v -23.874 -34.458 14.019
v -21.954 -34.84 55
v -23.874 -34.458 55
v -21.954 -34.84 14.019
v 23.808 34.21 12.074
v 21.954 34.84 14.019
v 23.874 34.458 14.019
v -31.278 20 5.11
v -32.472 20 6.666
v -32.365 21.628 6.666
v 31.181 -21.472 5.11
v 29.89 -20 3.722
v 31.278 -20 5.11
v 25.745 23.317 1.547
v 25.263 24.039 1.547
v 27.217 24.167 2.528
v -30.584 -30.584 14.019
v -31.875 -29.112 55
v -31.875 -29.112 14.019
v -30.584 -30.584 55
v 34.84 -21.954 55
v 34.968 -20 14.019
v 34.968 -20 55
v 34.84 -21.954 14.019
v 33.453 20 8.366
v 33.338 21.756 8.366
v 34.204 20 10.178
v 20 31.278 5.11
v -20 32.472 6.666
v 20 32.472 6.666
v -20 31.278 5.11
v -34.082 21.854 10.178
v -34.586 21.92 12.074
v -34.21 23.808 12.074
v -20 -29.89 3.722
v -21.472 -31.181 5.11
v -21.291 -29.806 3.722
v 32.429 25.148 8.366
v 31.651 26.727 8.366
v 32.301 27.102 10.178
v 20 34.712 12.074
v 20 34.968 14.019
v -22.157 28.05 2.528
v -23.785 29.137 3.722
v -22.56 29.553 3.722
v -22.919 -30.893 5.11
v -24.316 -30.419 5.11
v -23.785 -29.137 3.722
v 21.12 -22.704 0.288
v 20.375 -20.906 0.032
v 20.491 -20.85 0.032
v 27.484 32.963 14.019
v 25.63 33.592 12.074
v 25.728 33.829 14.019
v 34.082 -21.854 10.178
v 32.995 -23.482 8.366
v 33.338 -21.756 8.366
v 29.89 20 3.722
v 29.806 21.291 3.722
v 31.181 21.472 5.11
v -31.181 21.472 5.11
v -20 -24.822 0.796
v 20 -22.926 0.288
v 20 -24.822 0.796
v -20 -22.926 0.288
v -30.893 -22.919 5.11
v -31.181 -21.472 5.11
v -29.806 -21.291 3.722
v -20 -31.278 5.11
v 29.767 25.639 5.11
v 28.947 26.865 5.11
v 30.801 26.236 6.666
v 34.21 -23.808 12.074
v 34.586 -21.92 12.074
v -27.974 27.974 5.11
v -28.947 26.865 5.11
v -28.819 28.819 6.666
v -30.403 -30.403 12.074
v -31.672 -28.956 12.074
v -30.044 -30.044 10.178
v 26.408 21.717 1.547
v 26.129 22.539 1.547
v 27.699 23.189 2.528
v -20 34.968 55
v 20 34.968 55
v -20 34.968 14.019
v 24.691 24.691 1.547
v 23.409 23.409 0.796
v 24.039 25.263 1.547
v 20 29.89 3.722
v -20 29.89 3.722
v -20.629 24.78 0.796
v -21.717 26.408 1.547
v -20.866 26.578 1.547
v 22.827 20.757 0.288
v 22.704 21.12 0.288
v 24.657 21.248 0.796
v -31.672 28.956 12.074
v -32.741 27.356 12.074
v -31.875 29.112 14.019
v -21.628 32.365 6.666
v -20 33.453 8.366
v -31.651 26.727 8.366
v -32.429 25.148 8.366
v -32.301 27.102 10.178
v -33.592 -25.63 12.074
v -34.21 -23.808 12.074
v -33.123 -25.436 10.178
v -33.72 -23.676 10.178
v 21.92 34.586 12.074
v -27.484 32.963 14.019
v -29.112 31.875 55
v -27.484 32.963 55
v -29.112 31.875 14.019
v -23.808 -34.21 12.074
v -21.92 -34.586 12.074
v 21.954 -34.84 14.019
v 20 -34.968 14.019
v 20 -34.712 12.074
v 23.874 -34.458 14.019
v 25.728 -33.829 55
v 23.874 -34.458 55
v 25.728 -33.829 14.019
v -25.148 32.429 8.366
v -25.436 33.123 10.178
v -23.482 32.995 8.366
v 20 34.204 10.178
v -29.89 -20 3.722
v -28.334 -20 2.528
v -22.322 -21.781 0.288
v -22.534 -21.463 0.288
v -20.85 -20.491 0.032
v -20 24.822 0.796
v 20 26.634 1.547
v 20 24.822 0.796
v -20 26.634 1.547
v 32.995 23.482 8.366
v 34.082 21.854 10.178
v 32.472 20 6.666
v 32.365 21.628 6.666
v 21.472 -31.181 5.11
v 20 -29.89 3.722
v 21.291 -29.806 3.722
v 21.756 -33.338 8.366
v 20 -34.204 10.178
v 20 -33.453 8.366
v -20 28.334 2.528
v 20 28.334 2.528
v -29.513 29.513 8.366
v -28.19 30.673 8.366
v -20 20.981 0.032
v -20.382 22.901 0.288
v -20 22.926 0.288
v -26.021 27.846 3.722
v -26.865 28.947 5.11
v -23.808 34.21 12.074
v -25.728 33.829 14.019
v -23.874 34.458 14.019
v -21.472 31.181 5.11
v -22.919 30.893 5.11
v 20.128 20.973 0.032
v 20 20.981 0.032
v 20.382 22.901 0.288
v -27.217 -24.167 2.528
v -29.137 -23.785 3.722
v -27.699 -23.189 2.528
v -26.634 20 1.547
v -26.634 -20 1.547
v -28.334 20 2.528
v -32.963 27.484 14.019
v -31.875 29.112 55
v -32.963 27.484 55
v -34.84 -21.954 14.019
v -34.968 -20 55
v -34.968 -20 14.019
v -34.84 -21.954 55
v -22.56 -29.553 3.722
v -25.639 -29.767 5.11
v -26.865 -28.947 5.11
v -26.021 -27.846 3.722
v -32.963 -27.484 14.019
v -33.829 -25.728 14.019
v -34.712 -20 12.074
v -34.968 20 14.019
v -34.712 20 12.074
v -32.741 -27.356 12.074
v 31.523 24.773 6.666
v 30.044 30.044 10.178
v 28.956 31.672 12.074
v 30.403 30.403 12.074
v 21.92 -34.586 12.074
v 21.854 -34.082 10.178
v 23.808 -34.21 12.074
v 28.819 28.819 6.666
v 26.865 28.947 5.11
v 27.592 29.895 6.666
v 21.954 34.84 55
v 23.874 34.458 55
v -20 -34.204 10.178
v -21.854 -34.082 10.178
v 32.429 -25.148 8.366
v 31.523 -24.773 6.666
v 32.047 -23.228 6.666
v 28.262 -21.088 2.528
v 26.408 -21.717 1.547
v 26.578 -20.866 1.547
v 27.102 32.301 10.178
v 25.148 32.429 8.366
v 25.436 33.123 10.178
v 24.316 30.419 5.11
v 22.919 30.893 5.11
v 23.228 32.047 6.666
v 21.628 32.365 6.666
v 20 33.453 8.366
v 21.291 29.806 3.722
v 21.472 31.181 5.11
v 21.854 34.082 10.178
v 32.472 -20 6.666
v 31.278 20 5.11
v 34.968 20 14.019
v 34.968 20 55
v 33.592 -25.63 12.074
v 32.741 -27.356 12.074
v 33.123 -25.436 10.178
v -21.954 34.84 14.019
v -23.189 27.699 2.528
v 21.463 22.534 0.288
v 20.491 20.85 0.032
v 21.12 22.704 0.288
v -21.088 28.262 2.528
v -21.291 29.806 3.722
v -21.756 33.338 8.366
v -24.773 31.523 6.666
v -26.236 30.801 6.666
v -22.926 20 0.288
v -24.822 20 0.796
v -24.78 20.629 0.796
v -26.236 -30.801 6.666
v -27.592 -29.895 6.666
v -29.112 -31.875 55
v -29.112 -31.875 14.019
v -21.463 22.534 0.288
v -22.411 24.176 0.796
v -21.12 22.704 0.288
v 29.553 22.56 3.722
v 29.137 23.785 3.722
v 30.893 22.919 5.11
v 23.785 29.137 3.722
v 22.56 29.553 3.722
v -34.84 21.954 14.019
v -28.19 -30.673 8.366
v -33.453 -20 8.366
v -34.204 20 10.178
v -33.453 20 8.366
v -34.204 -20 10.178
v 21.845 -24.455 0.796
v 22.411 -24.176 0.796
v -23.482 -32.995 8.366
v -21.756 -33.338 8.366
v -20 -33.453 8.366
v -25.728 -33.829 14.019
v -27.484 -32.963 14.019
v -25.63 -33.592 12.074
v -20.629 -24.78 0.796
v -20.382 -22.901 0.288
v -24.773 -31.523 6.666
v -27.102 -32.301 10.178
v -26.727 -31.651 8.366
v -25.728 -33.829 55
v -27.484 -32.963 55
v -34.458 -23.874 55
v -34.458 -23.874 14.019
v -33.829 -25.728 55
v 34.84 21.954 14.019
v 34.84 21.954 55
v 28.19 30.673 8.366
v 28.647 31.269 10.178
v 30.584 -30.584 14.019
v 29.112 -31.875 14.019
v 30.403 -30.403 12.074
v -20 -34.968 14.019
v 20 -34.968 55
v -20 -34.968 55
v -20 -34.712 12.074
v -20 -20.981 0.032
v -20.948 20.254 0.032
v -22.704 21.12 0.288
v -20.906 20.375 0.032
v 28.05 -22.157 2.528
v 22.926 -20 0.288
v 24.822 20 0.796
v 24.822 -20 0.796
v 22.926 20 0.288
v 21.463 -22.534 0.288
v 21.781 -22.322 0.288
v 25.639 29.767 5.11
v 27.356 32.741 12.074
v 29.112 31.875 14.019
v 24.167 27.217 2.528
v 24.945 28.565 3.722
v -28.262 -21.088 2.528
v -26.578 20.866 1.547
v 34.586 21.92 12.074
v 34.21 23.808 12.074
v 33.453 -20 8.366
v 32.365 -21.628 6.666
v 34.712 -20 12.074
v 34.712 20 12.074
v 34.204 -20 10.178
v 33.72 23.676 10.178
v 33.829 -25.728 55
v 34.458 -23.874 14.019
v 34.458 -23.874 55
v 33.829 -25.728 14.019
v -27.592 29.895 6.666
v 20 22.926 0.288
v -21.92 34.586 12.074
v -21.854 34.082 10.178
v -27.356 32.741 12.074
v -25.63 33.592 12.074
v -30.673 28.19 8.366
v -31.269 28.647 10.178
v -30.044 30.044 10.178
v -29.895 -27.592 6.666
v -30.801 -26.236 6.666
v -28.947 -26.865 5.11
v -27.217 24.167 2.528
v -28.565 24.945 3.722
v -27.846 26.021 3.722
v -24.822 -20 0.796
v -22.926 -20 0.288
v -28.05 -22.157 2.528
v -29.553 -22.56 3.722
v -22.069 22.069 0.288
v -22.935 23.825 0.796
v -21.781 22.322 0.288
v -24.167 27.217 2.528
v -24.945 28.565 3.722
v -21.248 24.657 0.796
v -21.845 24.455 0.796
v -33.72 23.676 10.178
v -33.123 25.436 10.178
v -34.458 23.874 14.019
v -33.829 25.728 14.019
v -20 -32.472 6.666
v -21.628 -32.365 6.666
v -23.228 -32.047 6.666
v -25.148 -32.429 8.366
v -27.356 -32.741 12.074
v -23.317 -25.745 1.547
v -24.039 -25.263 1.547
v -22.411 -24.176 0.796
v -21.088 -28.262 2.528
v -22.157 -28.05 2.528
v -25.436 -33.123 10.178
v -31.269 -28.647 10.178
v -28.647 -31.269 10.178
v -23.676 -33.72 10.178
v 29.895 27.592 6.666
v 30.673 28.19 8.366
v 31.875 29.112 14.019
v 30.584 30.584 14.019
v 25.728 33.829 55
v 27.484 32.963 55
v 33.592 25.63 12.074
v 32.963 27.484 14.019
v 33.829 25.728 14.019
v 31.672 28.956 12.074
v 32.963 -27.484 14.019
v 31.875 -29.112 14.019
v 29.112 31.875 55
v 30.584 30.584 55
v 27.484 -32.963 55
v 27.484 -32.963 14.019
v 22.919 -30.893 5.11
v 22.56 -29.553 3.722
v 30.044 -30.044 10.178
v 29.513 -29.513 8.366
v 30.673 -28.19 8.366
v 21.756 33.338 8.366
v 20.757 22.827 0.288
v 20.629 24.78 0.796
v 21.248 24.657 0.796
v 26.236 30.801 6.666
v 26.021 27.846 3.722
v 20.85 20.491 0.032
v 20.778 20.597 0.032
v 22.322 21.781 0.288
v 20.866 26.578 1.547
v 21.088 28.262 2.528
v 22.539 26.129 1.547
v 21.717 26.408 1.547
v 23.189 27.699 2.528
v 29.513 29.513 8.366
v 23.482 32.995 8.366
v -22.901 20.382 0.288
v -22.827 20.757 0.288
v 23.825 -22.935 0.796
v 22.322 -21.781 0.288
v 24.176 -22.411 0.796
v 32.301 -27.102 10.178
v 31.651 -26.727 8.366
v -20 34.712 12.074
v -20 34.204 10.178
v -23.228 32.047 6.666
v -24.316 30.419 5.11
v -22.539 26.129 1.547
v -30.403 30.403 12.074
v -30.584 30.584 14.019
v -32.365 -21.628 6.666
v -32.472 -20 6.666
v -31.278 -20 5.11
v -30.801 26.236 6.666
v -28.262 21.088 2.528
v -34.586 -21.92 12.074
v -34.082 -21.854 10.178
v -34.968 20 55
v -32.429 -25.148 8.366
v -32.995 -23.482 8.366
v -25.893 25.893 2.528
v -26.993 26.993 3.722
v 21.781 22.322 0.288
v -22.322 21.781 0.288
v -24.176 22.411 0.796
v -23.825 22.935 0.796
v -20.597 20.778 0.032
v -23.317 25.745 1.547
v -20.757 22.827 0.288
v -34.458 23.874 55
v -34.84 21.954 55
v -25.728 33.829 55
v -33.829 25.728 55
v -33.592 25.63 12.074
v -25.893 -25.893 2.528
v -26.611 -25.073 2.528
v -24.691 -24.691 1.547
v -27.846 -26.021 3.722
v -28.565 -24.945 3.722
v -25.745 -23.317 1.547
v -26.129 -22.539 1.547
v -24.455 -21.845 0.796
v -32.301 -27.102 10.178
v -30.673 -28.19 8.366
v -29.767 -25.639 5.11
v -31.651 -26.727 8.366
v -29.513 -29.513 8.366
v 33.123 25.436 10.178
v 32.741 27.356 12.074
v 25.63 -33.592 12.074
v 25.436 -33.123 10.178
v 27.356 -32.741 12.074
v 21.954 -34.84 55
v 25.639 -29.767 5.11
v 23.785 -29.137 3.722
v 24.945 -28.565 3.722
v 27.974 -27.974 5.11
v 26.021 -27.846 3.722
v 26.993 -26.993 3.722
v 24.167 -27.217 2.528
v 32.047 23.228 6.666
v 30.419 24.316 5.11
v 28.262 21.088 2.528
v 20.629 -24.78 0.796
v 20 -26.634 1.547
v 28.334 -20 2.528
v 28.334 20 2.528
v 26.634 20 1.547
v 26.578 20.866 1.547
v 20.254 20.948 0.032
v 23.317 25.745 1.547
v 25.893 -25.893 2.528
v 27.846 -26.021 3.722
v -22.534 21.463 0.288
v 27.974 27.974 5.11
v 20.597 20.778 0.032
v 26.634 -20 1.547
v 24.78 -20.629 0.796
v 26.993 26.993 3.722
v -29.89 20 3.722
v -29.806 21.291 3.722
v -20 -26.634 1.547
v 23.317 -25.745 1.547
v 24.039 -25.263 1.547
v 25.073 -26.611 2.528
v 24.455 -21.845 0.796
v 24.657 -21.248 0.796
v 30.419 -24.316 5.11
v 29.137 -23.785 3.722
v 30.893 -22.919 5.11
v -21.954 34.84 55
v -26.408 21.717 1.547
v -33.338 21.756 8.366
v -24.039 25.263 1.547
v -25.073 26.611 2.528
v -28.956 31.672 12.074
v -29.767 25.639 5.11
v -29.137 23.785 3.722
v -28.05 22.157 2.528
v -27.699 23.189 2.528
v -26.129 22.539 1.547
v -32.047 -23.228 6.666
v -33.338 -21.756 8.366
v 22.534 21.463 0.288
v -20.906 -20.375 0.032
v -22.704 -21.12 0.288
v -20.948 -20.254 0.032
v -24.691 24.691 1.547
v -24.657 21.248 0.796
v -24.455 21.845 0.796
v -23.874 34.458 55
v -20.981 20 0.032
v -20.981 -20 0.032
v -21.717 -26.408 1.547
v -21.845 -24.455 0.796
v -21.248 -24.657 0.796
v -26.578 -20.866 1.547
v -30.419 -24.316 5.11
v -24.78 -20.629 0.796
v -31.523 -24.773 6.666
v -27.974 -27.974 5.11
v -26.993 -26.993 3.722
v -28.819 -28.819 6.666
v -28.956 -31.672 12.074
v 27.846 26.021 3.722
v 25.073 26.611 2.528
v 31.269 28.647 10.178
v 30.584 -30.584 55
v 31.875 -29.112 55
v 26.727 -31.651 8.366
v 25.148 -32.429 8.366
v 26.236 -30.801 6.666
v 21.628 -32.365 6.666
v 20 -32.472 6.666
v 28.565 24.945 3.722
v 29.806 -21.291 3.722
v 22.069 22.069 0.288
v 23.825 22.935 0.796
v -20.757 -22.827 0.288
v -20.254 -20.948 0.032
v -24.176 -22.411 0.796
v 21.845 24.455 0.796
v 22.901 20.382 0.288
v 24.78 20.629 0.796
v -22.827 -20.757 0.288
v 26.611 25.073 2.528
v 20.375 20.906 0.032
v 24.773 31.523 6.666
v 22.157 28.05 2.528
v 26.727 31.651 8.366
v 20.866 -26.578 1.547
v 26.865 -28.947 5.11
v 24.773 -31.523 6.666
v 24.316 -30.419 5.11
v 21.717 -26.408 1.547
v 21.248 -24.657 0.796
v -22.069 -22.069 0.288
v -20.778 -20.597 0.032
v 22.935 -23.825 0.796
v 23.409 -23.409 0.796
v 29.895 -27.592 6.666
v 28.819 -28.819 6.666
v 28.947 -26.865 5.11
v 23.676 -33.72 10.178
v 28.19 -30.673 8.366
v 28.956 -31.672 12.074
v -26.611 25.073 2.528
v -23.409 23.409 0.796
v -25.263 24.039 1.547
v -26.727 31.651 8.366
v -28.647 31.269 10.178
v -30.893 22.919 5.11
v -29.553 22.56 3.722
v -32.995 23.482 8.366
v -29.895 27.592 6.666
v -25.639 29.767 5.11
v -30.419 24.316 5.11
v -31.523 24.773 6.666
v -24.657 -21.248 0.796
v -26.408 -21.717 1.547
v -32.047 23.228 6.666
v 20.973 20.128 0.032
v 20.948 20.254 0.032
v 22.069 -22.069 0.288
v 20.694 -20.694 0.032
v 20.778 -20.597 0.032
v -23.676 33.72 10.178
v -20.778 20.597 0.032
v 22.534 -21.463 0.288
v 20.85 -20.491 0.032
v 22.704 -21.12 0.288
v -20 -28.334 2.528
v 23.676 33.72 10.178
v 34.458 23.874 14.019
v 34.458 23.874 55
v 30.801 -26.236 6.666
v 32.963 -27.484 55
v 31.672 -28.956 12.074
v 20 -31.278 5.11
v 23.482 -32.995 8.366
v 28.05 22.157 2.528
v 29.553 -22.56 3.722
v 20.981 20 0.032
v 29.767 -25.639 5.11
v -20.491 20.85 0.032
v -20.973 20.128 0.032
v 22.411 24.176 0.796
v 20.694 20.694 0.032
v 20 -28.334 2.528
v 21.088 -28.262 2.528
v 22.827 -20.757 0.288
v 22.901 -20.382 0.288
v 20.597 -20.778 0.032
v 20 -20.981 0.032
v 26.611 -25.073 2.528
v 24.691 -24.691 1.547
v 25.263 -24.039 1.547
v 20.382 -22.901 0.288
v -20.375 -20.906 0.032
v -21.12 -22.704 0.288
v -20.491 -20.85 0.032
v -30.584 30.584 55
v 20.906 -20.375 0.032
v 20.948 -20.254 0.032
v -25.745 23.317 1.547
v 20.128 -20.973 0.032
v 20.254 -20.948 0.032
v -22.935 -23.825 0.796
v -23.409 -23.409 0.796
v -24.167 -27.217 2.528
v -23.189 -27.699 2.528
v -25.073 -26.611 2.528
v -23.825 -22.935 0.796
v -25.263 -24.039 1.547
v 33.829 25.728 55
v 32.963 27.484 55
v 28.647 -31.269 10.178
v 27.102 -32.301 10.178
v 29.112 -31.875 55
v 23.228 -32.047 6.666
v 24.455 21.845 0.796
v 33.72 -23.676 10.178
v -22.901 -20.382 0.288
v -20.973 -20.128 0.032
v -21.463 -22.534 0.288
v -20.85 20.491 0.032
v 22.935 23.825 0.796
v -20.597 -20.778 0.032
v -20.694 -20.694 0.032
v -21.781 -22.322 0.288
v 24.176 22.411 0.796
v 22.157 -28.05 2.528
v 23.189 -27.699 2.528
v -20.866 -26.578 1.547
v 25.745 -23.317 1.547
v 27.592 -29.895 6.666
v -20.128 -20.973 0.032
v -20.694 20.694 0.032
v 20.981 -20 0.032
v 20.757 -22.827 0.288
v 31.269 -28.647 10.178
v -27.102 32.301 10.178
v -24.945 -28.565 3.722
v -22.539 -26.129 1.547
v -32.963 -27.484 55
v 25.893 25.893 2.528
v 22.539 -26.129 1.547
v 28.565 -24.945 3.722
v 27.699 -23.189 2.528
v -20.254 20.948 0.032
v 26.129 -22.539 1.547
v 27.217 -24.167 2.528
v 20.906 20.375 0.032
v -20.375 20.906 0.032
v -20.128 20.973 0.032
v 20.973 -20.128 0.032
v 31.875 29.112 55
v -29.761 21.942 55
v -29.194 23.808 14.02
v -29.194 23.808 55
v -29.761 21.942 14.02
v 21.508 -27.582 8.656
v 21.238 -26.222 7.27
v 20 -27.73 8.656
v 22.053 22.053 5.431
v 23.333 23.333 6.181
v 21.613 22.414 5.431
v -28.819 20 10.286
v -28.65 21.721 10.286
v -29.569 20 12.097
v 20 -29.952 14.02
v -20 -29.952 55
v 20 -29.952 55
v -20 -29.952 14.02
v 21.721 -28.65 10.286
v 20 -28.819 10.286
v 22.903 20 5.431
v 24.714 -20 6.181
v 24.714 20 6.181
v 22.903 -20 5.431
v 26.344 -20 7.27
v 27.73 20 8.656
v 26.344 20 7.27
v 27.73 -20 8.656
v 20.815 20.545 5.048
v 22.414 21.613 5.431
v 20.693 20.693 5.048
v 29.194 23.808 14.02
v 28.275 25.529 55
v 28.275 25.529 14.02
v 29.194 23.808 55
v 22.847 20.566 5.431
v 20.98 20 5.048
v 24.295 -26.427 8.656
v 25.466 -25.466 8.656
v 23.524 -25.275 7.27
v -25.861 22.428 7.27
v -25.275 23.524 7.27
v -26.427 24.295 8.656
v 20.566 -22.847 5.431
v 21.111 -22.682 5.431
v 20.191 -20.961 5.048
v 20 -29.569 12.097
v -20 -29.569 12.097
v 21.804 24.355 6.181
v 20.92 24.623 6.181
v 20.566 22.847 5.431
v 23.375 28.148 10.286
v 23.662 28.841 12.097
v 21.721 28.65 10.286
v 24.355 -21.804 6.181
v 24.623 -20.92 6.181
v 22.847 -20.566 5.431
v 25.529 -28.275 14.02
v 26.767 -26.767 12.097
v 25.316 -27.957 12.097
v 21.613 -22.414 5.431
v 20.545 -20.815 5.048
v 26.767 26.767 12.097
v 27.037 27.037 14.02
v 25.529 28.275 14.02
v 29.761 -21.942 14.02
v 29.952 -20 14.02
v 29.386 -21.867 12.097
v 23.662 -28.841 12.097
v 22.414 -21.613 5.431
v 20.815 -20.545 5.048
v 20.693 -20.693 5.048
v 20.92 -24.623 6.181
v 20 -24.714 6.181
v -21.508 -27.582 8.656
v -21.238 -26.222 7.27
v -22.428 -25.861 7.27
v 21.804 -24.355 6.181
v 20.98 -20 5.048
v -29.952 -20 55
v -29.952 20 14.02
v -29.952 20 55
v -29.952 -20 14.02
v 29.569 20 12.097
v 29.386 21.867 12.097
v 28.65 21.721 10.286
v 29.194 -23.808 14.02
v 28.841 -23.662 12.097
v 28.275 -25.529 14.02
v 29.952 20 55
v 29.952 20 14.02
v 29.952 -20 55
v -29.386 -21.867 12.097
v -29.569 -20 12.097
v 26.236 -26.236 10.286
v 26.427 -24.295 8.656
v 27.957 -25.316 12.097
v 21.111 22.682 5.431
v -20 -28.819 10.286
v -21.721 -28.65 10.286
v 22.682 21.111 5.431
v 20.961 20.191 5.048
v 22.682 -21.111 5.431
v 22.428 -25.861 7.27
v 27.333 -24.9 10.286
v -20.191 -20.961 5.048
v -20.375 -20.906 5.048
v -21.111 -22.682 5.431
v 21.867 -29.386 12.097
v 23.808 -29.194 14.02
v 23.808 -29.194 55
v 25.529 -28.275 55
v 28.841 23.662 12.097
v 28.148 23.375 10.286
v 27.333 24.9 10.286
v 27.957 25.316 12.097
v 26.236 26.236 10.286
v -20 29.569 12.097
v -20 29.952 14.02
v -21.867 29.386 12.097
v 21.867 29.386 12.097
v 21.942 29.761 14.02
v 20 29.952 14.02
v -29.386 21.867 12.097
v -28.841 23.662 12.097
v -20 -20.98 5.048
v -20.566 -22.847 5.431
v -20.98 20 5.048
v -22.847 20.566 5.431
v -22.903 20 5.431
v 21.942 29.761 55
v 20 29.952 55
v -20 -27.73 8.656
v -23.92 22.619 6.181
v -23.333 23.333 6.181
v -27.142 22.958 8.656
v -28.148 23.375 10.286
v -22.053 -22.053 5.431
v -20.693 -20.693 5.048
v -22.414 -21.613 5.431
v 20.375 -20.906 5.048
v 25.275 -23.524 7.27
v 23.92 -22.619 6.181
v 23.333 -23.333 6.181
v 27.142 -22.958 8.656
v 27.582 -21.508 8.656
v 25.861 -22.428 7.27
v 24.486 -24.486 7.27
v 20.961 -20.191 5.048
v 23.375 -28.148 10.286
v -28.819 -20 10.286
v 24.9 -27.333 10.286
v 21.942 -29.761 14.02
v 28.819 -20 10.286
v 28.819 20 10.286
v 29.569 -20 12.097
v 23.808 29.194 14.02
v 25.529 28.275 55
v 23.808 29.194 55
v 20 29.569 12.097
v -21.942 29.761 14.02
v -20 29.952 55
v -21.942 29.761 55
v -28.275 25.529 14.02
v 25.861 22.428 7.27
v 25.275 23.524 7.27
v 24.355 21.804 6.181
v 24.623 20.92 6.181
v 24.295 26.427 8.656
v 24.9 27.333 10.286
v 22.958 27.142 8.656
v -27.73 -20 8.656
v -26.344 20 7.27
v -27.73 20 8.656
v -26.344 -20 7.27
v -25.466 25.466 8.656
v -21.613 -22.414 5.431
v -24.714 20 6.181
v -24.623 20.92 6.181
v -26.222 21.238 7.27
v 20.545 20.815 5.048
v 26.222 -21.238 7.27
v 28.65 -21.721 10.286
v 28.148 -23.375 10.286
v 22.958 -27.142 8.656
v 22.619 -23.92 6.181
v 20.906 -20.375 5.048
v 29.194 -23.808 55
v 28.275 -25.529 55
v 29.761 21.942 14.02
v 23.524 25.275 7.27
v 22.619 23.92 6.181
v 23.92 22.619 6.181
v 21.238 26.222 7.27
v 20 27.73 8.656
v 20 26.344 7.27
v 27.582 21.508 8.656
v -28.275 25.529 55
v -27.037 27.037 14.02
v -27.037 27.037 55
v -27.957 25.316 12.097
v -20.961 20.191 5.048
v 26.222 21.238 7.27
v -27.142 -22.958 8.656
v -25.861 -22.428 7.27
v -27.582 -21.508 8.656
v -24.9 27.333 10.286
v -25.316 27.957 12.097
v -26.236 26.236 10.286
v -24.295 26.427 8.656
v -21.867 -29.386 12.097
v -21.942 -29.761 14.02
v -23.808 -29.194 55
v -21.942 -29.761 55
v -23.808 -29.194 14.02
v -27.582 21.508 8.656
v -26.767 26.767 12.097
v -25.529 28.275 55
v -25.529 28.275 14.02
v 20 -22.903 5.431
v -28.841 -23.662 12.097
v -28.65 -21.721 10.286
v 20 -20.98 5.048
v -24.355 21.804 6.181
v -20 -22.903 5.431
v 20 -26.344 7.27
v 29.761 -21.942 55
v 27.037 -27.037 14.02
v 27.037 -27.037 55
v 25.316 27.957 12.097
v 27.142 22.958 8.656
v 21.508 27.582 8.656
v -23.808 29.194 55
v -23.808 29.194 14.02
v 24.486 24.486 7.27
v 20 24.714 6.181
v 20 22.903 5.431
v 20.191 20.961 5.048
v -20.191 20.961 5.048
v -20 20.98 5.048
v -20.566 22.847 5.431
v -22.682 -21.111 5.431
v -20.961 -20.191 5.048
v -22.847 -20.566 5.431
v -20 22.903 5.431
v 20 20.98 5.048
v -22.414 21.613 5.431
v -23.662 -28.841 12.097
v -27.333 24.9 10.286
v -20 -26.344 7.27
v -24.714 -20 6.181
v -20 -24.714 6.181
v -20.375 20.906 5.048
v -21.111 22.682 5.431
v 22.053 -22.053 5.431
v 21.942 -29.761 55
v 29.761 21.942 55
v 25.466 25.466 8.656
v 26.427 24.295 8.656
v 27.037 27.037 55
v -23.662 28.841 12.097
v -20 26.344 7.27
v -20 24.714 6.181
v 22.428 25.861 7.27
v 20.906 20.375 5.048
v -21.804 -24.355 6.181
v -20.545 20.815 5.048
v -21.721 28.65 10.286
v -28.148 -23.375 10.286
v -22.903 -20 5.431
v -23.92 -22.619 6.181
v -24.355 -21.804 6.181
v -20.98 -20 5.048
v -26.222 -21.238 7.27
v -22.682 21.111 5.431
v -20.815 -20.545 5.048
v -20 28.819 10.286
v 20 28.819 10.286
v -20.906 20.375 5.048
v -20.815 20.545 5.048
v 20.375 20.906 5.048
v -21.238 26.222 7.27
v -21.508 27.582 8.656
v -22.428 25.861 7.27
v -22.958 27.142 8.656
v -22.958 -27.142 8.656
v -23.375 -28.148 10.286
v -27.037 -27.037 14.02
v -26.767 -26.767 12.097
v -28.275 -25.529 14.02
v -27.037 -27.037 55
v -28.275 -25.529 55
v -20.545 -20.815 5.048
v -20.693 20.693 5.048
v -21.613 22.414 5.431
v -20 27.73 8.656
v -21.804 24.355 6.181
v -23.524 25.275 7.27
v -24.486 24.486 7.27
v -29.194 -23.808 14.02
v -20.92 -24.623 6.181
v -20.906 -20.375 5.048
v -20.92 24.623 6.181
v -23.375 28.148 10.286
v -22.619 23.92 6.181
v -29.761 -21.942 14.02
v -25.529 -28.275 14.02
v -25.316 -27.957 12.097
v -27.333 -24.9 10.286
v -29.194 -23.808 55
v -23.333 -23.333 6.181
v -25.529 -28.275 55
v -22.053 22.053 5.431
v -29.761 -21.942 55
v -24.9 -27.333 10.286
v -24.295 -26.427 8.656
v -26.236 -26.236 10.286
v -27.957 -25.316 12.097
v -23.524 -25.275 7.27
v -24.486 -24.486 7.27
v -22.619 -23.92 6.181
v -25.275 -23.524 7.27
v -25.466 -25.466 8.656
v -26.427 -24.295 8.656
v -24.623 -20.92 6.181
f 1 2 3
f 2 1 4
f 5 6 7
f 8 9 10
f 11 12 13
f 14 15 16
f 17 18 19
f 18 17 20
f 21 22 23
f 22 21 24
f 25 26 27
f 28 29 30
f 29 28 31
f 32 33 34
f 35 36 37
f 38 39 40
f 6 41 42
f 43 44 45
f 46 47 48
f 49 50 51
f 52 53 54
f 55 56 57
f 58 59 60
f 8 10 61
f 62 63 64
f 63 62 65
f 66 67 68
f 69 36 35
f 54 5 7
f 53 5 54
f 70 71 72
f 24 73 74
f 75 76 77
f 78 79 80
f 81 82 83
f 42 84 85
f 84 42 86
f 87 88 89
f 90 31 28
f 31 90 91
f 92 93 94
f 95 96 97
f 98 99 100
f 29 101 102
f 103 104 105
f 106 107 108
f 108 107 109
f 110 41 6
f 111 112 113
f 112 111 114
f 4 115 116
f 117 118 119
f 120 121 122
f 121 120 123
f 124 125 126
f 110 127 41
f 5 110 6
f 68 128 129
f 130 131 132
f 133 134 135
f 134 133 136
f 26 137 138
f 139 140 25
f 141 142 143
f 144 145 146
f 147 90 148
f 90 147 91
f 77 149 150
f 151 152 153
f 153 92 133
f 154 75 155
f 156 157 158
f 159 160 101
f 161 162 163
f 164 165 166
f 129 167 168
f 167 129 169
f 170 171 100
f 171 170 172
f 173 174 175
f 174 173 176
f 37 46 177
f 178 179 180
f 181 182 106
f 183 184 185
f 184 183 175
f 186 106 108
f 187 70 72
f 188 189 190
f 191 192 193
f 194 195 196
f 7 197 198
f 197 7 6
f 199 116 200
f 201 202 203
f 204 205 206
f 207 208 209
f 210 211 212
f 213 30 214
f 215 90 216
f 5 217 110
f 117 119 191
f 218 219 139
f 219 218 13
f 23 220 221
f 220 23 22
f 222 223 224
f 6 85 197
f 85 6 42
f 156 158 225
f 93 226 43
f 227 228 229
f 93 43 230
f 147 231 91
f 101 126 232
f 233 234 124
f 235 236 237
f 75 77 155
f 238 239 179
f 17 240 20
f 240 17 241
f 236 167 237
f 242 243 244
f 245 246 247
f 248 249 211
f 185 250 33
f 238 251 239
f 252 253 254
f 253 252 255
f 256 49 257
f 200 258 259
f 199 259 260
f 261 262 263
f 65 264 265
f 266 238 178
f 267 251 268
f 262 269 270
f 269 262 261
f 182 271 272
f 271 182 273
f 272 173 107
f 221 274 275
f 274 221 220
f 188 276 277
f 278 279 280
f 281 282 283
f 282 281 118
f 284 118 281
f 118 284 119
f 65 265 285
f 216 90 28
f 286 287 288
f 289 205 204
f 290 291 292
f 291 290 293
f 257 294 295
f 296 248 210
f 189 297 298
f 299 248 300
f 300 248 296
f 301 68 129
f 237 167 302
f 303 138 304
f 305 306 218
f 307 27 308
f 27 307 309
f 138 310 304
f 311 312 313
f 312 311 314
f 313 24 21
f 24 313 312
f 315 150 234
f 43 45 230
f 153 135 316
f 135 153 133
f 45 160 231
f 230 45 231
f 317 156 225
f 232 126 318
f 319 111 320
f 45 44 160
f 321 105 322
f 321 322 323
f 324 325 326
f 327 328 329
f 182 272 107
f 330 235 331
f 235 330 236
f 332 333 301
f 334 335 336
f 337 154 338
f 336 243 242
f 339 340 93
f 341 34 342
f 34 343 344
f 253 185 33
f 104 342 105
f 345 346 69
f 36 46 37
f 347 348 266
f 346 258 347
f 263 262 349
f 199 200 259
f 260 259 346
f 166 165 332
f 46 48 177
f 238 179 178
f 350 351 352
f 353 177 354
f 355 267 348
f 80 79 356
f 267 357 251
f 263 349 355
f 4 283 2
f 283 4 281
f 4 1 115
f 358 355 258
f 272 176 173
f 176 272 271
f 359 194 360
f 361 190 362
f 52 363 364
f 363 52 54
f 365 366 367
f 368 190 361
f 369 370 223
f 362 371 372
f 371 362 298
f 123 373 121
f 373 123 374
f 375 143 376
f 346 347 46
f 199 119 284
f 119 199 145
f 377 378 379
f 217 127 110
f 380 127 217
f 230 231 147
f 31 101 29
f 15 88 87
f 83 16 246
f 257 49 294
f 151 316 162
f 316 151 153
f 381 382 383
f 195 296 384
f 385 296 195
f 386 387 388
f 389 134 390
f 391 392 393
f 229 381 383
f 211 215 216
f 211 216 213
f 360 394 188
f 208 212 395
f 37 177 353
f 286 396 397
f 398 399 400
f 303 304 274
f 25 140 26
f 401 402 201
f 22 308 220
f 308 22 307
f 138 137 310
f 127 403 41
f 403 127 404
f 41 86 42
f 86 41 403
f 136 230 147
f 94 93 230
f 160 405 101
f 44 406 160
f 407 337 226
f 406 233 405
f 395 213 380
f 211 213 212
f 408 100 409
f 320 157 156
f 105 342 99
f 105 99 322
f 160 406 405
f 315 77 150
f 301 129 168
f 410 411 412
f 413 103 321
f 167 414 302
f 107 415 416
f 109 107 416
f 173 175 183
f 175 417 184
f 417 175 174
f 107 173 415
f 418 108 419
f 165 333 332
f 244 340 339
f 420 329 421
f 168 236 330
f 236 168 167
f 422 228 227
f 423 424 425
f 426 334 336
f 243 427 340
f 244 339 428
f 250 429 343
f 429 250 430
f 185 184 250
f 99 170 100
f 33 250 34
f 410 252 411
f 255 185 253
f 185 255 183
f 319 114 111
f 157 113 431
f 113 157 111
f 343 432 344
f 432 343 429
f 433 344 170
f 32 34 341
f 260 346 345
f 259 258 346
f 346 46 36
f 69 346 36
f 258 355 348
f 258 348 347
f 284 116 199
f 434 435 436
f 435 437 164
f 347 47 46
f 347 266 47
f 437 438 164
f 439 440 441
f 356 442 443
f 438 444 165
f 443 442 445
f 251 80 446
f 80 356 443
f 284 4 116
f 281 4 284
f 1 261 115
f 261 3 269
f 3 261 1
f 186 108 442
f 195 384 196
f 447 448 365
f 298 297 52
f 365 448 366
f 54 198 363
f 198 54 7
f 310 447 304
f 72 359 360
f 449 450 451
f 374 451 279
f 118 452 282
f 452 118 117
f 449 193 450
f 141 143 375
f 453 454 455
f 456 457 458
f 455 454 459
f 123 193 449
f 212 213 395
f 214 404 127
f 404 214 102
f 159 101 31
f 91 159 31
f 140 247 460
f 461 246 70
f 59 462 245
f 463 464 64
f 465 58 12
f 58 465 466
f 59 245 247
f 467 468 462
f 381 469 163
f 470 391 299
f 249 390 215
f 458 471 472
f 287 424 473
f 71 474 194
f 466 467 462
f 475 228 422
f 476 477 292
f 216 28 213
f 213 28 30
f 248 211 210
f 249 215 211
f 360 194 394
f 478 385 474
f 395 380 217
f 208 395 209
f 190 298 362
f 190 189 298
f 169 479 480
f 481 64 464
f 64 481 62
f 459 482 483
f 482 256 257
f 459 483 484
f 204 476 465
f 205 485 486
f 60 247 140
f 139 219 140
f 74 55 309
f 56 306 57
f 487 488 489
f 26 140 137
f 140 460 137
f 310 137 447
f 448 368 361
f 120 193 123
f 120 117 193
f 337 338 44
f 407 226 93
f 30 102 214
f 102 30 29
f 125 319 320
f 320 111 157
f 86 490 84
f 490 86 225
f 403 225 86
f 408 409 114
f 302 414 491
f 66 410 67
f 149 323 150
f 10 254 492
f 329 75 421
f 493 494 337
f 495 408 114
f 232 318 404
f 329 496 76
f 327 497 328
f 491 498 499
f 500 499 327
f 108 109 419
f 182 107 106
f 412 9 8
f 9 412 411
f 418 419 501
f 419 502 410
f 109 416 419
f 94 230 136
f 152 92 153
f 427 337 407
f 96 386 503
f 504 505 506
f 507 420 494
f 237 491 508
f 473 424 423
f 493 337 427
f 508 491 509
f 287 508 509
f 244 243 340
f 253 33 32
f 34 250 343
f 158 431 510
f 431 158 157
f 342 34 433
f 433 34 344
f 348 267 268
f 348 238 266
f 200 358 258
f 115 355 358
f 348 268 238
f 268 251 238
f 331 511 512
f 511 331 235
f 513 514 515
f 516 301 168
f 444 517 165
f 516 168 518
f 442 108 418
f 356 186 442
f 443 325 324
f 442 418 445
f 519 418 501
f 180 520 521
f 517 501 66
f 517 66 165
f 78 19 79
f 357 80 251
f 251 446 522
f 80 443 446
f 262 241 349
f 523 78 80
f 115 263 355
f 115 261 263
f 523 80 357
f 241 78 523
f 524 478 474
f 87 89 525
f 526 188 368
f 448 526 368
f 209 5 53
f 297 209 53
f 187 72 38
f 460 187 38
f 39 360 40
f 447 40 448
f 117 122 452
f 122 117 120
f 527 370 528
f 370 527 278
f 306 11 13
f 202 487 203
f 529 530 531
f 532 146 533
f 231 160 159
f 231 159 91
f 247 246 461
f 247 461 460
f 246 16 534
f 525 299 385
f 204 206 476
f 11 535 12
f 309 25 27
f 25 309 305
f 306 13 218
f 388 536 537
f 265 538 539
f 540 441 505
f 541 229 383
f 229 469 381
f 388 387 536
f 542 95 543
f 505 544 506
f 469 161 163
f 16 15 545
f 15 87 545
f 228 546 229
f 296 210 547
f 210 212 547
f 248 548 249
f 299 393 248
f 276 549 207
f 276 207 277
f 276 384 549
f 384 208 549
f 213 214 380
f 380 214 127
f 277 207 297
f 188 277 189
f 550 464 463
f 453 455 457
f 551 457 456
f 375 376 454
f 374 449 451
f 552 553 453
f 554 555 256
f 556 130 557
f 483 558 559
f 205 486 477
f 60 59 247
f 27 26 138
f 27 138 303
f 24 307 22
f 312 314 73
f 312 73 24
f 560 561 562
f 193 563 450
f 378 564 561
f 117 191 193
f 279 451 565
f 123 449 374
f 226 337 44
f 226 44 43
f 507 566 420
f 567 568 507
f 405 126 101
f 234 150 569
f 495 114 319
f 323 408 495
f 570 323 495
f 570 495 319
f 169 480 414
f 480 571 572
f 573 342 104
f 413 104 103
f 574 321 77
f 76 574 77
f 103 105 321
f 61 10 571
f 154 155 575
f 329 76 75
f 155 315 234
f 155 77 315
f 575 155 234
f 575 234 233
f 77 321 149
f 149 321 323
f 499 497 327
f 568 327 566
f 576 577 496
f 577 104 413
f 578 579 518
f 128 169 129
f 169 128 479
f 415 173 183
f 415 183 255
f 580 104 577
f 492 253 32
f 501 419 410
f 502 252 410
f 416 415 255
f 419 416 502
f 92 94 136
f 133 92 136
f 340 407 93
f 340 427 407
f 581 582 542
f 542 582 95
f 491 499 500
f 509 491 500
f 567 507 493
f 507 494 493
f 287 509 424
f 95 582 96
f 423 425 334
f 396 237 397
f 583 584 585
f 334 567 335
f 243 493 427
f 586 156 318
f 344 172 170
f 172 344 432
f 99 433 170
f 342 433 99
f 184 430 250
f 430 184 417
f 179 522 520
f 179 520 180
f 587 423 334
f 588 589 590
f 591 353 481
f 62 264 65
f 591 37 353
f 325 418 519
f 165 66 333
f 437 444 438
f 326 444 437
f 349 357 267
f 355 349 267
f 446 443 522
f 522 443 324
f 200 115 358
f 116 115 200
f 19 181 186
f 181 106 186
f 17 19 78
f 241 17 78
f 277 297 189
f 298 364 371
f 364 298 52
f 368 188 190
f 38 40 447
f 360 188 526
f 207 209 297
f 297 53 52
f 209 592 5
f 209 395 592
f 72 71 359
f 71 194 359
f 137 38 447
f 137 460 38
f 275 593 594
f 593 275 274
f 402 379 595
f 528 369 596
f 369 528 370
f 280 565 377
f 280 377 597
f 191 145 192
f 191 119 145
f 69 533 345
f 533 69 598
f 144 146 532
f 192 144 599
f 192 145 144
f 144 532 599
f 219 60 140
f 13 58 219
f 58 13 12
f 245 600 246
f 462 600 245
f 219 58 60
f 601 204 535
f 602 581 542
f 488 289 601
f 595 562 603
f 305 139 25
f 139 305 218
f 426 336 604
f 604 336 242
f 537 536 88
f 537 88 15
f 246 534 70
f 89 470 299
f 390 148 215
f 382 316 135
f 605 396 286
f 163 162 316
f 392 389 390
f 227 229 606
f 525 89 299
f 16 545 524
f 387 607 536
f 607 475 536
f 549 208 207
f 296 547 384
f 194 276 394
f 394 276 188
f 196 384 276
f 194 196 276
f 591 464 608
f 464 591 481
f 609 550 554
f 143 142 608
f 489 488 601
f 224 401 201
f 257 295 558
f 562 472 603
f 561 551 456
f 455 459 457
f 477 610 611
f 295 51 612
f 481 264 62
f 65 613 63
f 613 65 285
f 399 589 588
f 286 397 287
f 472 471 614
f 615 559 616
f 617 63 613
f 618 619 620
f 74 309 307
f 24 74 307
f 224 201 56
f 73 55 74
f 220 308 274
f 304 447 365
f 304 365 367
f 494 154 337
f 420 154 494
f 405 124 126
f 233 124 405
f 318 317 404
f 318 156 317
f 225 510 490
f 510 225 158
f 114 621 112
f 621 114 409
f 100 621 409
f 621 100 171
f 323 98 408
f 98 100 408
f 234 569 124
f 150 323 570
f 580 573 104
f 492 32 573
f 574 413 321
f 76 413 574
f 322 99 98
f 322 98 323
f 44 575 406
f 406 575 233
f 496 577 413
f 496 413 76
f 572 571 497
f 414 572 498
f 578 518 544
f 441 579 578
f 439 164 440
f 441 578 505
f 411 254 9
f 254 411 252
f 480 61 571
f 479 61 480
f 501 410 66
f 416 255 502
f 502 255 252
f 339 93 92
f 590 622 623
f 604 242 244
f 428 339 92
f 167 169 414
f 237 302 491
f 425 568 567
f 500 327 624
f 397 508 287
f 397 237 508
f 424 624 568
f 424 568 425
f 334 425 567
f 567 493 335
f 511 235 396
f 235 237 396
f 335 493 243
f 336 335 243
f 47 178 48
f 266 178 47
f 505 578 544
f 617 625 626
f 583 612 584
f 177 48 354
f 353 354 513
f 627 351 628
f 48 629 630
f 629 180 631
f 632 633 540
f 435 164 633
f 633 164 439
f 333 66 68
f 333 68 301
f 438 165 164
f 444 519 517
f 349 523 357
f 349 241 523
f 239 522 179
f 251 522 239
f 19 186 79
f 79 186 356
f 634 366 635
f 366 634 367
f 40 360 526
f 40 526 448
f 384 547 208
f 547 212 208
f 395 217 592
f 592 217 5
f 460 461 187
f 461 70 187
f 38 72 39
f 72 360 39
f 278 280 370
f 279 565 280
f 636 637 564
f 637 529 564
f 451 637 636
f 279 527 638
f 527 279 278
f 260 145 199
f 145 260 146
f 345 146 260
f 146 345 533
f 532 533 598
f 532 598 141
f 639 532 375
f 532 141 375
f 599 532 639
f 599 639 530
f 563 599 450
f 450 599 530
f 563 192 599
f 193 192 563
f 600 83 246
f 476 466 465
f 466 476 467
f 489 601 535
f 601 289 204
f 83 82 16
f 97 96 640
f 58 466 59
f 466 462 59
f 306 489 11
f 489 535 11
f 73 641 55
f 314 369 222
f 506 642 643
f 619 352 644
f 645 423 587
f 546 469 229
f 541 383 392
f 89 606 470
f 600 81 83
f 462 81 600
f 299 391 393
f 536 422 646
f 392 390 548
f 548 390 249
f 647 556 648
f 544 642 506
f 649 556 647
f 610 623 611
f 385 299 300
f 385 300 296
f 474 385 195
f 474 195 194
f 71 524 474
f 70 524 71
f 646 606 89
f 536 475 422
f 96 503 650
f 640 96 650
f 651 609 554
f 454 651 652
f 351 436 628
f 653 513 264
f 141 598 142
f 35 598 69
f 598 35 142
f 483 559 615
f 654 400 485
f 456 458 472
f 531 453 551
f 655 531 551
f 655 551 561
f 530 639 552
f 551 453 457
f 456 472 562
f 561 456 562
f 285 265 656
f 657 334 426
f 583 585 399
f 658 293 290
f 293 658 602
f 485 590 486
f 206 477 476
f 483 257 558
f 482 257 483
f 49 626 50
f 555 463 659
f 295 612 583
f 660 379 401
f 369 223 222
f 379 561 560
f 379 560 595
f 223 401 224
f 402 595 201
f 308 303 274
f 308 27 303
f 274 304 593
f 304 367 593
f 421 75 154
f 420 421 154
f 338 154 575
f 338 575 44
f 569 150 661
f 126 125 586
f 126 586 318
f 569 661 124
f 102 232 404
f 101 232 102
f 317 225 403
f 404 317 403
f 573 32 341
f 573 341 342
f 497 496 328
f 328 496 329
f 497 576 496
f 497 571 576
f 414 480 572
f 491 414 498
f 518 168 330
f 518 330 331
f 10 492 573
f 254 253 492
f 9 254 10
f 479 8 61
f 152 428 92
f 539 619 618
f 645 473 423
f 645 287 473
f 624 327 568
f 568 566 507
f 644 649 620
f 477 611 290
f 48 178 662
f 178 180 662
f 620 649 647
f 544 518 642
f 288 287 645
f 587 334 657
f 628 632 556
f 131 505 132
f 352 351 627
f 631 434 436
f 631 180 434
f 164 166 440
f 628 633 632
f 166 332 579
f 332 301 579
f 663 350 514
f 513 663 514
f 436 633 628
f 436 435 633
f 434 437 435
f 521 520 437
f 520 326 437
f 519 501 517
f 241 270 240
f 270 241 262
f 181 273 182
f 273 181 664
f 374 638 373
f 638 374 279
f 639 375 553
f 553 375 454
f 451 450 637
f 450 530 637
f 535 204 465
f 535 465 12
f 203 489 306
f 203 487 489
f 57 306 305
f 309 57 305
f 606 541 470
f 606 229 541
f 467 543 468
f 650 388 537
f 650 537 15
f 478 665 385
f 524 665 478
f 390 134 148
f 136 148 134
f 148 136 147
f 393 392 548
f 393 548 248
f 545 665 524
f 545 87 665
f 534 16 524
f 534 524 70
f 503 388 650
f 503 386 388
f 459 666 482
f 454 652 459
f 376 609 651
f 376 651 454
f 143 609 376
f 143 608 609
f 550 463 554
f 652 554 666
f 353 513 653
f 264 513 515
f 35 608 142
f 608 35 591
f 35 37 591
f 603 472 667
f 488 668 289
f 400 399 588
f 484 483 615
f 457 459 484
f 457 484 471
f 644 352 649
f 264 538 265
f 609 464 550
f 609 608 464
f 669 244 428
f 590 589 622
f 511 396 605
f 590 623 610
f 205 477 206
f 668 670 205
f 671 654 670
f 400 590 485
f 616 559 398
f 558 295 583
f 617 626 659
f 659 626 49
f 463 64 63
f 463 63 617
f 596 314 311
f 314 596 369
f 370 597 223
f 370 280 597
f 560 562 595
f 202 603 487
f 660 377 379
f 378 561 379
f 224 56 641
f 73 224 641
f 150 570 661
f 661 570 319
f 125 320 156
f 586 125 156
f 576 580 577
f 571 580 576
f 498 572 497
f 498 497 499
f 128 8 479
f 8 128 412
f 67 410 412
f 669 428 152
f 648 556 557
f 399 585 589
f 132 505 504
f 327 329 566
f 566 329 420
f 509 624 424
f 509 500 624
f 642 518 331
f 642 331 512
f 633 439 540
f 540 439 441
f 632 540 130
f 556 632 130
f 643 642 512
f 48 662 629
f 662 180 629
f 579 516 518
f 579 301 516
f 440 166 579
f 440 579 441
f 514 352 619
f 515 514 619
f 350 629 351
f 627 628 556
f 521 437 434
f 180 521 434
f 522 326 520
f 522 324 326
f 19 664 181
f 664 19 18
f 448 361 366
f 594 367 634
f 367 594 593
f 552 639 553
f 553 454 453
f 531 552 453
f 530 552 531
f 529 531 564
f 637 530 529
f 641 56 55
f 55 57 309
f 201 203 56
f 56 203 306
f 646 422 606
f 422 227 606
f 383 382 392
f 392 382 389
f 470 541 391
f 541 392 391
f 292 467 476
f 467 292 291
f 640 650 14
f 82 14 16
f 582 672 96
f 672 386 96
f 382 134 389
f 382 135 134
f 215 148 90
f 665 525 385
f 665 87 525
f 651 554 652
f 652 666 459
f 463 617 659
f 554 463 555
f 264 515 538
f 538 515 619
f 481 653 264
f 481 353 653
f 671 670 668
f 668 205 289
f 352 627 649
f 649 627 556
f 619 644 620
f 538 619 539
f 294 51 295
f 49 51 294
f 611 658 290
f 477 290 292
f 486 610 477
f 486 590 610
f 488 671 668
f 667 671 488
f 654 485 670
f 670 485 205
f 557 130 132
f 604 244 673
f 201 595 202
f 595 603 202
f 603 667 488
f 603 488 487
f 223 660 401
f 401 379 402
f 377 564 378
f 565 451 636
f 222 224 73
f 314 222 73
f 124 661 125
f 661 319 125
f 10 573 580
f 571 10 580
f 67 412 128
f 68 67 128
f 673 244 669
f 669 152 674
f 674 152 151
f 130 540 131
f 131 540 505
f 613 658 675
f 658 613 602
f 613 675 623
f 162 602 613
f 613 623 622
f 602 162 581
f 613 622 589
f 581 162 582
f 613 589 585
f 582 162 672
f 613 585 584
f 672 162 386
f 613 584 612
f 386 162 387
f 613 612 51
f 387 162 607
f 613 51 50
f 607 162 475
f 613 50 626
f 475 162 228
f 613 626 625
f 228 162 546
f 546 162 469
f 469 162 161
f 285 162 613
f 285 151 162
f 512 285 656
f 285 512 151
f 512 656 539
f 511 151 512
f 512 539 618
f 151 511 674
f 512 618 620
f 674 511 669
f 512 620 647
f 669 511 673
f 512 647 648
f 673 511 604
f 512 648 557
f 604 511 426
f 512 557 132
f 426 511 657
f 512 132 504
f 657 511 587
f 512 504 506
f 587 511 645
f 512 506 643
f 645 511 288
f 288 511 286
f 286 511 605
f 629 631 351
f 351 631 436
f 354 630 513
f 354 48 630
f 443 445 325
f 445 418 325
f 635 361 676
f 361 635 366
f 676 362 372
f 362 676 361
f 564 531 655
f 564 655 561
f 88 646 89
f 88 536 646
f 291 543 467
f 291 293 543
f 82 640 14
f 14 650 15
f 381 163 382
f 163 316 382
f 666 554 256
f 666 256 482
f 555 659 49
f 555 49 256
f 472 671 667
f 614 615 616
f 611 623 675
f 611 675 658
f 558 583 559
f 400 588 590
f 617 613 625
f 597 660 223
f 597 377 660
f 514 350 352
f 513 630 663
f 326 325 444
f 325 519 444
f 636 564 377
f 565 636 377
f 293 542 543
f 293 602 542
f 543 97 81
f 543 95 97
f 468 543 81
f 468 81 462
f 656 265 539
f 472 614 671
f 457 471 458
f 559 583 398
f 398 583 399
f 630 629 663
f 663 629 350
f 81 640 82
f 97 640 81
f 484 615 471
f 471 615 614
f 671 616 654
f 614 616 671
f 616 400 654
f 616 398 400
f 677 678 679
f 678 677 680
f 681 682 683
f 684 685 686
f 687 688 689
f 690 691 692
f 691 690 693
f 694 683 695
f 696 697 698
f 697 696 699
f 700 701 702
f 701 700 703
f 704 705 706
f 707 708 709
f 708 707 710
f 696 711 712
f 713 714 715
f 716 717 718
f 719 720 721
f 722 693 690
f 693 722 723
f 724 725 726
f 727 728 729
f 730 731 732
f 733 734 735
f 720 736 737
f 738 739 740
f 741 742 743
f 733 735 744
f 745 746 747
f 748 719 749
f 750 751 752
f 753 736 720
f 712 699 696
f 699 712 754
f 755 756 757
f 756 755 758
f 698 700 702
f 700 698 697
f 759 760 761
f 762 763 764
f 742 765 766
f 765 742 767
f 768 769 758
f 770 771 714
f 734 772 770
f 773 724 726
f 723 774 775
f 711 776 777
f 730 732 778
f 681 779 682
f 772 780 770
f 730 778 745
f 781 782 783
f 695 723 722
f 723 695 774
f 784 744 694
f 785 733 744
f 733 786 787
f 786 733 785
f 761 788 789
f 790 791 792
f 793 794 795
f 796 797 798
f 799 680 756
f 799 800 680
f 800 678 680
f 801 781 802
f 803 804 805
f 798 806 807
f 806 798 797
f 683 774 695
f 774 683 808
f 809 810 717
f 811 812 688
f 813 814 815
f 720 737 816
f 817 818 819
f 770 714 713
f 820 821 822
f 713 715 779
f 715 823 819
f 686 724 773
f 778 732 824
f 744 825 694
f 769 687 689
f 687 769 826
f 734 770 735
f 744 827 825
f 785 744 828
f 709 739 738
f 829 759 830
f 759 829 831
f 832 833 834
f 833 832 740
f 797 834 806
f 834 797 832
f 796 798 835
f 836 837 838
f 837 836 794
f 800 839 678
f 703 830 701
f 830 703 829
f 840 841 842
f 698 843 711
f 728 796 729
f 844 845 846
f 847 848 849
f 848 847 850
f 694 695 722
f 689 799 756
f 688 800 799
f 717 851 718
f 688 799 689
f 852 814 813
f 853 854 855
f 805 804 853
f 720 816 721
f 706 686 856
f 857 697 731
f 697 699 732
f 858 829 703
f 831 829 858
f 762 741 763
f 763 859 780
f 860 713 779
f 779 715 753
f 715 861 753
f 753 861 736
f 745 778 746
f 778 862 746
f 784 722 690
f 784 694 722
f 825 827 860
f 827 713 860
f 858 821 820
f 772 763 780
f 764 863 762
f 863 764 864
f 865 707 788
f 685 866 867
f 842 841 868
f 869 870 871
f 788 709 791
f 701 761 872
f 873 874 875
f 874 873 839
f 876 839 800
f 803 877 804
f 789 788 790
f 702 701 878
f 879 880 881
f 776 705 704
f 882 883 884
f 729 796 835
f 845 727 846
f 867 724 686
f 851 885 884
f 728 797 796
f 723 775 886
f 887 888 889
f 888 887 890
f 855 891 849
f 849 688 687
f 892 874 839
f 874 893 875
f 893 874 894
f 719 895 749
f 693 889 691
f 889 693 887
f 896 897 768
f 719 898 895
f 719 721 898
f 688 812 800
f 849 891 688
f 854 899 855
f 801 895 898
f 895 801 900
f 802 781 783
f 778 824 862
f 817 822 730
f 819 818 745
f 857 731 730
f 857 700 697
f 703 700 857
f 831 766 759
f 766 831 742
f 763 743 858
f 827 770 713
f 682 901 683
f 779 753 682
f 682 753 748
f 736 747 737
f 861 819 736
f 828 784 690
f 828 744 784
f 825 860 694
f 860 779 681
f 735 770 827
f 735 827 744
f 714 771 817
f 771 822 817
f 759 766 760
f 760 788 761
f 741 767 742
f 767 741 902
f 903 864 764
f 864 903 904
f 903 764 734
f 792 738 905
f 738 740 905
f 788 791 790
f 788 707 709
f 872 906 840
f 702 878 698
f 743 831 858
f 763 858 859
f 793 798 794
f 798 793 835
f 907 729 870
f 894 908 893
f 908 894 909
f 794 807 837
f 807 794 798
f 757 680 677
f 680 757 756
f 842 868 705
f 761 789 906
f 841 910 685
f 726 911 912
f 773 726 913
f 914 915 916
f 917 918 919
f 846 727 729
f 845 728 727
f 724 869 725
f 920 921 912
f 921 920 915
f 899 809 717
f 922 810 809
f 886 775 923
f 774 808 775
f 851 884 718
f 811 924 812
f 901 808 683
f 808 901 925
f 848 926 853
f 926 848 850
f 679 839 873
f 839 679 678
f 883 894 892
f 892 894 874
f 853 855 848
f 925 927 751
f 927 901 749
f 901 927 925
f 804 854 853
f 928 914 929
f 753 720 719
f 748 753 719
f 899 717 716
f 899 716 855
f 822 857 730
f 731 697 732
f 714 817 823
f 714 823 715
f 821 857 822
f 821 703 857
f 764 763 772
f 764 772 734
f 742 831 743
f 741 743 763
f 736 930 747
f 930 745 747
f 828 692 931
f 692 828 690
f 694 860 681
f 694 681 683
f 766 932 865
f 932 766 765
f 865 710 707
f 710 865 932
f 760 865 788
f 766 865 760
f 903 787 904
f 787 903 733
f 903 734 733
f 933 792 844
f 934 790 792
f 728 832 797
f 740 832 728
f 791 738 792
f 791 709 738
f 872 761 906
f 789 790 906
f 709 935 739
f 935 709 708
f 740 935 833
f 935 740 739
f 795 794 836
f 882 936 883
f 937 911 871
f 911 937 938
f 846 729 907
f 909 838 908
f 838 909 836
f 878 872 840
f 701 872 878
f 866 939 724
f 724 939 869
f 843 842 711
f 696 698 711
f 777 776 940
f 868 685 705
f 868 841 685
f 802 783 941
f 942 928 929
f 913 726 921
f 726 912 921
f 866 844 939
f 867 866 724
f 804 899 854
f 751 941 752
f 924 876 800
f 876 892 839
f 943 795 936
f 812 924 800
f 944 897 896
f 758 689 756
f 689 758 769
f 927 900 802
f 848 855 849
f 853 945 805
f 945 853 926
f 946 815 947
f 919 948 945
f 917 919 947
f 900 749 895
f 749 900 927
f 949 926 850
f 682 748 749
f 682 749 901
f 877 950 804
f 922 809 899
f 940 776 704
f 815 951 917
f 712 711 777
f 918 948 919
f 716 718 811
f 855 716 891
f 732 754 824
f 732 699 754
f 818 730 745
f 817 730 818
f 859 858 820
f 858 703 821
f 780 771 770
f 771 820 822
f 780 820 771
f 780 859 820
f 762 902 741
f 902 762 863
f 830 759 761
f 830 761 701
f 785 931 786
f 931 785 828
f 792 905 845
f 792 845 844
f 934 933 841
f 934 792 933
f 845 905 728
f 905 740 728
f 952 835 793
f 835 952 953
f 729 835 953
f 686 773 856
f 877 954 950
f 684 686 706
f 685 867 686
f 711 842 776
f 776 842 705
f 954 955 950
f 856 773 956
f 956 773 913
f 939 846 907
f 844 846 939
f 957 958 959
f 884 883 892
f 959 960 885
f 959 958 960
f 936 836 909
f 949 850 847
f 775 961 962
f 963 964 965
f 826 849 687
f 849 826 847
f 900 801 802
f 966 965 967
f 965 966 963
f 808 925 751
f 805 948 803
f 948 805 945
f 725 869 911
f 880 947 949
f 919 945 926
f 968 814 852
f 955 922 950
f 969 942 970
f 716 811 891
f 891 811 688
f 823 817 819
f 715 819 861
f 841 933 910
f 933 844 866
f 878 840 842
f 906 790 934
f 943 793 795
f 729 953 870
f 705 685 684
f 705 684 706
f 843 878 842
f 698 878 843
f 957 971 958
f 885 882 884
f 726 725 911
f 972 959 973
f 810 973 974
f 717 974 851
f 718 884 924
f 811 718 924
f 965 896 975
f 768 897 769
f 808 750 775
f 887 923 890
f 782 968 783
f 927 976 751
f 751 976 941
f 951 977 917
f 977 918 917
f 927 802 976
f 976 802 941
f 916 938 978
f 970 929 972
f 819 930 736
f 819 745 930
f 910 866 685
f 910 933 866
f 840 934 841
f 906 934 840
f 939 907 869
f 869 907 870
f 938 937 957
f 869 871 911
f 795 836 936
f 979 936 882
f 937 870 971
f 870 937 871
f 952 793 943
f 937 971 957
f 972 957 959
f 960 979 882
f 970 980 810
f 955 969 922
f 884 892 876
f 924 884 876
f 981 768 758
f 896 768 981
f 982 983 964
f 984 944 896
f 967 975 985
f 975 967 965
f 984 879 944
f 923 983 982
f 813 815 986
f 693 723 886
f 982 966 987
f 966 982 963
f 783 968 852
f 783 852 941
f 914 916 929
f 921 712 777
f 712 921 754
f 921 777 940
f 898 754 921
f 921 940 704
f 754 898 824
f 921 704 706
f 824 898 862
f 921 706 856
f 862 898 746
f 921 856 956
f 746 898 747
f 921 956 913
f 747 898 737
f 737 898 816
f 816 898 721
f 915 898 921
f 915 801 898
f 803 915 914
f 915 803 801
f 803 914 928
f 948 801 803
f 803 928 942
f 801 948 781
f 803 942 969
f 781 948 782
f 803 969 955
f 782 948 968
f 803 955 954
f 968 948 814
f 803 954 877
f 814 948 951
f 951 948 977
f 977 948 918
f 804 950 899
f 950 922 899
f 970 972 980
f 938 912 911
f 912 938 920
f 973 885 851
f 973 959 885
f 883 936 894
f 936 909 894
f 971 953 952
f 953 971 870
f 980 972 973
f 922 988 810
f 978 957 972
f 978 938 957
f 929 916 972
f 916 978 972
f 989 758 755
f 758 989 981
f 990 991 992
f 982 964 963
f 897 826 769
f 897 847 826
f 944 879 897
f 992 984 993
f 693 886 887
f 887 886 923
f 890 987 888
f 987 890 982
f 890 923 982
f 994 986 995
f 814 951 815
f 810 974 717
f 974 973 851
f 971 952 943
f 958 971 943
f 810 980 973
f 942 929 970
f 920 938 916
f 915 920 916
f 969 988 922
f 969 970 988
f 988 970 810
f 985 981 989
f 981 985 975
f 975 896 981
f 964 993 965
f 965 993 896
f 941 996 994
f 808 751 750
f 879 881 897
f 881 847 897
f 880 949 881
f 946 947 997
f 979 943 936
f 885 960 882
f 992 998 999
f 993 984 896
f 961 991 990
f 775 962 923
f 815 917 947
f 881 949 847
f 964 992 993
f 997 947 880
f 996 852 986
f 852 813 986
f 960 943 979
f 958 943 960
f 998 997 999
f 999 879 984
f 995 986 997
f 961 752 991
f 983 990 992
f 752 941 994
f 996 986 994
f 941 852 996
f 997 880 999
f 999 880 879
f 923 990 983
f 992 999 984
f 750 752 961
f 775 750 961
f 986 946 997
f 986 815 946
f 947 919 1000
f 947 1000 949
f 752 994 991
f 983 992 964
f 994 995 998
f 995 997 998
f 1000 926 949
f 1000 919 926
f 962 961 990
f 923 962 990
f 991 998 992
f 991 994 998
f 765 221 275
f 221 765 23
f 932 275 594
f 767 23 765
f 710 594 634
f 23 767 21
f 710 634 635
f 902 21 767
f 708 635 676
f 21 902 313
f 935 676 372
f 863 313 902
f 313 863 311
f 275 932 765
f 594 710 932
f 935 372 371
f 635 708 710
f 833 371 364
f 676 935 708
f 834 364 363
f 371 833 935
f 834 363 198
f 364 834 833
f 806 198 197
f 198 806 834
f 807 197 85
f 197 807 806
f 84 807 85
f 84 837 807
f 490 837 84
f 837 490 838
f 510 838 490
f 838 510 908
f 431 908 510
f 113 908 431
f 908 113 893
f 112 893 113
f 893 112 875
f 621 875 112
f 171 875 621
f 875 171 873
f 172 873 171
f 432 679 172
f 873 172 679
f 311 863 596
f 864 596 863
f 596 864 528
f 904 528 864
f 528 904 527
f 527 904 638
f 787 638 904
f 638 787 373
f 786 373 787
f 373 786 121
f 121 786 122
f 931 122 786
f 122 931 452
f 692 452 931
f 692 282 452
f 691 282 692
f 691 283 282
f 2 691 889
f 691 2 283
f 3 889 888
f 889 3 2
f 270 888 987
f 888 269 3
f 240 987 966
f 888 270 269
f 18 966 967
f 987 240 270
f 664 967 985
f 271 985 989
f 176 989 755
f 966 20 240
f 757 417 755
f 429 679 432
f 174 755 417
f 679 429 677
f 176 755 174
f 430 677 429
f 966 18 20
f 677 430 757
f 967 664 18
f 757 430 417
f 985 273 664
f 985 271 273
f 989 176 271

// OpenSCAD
//Make a box or a lid:
type="box";//[box,lid]

//Outer height of box with lid:
height=70;//[20:150]
//Outer width of box:
width=70;//[20:150]
//Outer depth of box:
depth=70;//[20:200]

//curvature of sides:
roundness=15;//[5:30]
// How smooth the rounded corners are. 10 is standard, 5 is quite smooth.
$fa=5;//[1:20]

//How thick the walls are:
thickness=5;//[1:20]

//How much space is between lid inset and inside of box:
wiggle_room=1;//[0:3]
//How deep the lid inset is:
flange_height=2;//[0:10]



inner_radius=roundness-thickness;
if(type=="lid"){
translate([-width/2+roundness,-depth/2+roundness,0]){
difference(){
	translate([0,0,roundness]){
	minkowski(){
		cube([width-2*roundness,depth-2*roundness,70-2*roundness]);
		sphere(roundness);}
}
translate([-roundness-1,-roundness-1,roundness])
cube([width+2,depth+2,roundness+70+1]);}
translate([wiggle_room/2,wiggle_room/2,roundness]){
	linear_extrude(height=flange_height){
		minkowski(){
		square([width-2*(inner_radius+thickness)-wiggle_room,depth-2*(inner_radius+thickness)-wiggle_room]);
	circle(inner_radius);}
}}}}

if (type=="box"){
if (inner_radius>0){
translate([-width/2+roundness,-depth/2+roundness,0]){
difference(){
	translate([0,0,roundness]){
	difference(){
	minkowski(){
		cube([width-2*roundness,depth-2*roundness,height-2*roundness]);
		sphere(roundness);}
	minkowski(){
		cube([width-2*(inner_radius+thickness),depth-2*(inner_radius+thickness),height-2*(thickness)]);
		sphere(inner_radius);}
}}
translate([-roundness,-roundness,height-roundness])
cube([width,depth,roundness+1]);}}}}
